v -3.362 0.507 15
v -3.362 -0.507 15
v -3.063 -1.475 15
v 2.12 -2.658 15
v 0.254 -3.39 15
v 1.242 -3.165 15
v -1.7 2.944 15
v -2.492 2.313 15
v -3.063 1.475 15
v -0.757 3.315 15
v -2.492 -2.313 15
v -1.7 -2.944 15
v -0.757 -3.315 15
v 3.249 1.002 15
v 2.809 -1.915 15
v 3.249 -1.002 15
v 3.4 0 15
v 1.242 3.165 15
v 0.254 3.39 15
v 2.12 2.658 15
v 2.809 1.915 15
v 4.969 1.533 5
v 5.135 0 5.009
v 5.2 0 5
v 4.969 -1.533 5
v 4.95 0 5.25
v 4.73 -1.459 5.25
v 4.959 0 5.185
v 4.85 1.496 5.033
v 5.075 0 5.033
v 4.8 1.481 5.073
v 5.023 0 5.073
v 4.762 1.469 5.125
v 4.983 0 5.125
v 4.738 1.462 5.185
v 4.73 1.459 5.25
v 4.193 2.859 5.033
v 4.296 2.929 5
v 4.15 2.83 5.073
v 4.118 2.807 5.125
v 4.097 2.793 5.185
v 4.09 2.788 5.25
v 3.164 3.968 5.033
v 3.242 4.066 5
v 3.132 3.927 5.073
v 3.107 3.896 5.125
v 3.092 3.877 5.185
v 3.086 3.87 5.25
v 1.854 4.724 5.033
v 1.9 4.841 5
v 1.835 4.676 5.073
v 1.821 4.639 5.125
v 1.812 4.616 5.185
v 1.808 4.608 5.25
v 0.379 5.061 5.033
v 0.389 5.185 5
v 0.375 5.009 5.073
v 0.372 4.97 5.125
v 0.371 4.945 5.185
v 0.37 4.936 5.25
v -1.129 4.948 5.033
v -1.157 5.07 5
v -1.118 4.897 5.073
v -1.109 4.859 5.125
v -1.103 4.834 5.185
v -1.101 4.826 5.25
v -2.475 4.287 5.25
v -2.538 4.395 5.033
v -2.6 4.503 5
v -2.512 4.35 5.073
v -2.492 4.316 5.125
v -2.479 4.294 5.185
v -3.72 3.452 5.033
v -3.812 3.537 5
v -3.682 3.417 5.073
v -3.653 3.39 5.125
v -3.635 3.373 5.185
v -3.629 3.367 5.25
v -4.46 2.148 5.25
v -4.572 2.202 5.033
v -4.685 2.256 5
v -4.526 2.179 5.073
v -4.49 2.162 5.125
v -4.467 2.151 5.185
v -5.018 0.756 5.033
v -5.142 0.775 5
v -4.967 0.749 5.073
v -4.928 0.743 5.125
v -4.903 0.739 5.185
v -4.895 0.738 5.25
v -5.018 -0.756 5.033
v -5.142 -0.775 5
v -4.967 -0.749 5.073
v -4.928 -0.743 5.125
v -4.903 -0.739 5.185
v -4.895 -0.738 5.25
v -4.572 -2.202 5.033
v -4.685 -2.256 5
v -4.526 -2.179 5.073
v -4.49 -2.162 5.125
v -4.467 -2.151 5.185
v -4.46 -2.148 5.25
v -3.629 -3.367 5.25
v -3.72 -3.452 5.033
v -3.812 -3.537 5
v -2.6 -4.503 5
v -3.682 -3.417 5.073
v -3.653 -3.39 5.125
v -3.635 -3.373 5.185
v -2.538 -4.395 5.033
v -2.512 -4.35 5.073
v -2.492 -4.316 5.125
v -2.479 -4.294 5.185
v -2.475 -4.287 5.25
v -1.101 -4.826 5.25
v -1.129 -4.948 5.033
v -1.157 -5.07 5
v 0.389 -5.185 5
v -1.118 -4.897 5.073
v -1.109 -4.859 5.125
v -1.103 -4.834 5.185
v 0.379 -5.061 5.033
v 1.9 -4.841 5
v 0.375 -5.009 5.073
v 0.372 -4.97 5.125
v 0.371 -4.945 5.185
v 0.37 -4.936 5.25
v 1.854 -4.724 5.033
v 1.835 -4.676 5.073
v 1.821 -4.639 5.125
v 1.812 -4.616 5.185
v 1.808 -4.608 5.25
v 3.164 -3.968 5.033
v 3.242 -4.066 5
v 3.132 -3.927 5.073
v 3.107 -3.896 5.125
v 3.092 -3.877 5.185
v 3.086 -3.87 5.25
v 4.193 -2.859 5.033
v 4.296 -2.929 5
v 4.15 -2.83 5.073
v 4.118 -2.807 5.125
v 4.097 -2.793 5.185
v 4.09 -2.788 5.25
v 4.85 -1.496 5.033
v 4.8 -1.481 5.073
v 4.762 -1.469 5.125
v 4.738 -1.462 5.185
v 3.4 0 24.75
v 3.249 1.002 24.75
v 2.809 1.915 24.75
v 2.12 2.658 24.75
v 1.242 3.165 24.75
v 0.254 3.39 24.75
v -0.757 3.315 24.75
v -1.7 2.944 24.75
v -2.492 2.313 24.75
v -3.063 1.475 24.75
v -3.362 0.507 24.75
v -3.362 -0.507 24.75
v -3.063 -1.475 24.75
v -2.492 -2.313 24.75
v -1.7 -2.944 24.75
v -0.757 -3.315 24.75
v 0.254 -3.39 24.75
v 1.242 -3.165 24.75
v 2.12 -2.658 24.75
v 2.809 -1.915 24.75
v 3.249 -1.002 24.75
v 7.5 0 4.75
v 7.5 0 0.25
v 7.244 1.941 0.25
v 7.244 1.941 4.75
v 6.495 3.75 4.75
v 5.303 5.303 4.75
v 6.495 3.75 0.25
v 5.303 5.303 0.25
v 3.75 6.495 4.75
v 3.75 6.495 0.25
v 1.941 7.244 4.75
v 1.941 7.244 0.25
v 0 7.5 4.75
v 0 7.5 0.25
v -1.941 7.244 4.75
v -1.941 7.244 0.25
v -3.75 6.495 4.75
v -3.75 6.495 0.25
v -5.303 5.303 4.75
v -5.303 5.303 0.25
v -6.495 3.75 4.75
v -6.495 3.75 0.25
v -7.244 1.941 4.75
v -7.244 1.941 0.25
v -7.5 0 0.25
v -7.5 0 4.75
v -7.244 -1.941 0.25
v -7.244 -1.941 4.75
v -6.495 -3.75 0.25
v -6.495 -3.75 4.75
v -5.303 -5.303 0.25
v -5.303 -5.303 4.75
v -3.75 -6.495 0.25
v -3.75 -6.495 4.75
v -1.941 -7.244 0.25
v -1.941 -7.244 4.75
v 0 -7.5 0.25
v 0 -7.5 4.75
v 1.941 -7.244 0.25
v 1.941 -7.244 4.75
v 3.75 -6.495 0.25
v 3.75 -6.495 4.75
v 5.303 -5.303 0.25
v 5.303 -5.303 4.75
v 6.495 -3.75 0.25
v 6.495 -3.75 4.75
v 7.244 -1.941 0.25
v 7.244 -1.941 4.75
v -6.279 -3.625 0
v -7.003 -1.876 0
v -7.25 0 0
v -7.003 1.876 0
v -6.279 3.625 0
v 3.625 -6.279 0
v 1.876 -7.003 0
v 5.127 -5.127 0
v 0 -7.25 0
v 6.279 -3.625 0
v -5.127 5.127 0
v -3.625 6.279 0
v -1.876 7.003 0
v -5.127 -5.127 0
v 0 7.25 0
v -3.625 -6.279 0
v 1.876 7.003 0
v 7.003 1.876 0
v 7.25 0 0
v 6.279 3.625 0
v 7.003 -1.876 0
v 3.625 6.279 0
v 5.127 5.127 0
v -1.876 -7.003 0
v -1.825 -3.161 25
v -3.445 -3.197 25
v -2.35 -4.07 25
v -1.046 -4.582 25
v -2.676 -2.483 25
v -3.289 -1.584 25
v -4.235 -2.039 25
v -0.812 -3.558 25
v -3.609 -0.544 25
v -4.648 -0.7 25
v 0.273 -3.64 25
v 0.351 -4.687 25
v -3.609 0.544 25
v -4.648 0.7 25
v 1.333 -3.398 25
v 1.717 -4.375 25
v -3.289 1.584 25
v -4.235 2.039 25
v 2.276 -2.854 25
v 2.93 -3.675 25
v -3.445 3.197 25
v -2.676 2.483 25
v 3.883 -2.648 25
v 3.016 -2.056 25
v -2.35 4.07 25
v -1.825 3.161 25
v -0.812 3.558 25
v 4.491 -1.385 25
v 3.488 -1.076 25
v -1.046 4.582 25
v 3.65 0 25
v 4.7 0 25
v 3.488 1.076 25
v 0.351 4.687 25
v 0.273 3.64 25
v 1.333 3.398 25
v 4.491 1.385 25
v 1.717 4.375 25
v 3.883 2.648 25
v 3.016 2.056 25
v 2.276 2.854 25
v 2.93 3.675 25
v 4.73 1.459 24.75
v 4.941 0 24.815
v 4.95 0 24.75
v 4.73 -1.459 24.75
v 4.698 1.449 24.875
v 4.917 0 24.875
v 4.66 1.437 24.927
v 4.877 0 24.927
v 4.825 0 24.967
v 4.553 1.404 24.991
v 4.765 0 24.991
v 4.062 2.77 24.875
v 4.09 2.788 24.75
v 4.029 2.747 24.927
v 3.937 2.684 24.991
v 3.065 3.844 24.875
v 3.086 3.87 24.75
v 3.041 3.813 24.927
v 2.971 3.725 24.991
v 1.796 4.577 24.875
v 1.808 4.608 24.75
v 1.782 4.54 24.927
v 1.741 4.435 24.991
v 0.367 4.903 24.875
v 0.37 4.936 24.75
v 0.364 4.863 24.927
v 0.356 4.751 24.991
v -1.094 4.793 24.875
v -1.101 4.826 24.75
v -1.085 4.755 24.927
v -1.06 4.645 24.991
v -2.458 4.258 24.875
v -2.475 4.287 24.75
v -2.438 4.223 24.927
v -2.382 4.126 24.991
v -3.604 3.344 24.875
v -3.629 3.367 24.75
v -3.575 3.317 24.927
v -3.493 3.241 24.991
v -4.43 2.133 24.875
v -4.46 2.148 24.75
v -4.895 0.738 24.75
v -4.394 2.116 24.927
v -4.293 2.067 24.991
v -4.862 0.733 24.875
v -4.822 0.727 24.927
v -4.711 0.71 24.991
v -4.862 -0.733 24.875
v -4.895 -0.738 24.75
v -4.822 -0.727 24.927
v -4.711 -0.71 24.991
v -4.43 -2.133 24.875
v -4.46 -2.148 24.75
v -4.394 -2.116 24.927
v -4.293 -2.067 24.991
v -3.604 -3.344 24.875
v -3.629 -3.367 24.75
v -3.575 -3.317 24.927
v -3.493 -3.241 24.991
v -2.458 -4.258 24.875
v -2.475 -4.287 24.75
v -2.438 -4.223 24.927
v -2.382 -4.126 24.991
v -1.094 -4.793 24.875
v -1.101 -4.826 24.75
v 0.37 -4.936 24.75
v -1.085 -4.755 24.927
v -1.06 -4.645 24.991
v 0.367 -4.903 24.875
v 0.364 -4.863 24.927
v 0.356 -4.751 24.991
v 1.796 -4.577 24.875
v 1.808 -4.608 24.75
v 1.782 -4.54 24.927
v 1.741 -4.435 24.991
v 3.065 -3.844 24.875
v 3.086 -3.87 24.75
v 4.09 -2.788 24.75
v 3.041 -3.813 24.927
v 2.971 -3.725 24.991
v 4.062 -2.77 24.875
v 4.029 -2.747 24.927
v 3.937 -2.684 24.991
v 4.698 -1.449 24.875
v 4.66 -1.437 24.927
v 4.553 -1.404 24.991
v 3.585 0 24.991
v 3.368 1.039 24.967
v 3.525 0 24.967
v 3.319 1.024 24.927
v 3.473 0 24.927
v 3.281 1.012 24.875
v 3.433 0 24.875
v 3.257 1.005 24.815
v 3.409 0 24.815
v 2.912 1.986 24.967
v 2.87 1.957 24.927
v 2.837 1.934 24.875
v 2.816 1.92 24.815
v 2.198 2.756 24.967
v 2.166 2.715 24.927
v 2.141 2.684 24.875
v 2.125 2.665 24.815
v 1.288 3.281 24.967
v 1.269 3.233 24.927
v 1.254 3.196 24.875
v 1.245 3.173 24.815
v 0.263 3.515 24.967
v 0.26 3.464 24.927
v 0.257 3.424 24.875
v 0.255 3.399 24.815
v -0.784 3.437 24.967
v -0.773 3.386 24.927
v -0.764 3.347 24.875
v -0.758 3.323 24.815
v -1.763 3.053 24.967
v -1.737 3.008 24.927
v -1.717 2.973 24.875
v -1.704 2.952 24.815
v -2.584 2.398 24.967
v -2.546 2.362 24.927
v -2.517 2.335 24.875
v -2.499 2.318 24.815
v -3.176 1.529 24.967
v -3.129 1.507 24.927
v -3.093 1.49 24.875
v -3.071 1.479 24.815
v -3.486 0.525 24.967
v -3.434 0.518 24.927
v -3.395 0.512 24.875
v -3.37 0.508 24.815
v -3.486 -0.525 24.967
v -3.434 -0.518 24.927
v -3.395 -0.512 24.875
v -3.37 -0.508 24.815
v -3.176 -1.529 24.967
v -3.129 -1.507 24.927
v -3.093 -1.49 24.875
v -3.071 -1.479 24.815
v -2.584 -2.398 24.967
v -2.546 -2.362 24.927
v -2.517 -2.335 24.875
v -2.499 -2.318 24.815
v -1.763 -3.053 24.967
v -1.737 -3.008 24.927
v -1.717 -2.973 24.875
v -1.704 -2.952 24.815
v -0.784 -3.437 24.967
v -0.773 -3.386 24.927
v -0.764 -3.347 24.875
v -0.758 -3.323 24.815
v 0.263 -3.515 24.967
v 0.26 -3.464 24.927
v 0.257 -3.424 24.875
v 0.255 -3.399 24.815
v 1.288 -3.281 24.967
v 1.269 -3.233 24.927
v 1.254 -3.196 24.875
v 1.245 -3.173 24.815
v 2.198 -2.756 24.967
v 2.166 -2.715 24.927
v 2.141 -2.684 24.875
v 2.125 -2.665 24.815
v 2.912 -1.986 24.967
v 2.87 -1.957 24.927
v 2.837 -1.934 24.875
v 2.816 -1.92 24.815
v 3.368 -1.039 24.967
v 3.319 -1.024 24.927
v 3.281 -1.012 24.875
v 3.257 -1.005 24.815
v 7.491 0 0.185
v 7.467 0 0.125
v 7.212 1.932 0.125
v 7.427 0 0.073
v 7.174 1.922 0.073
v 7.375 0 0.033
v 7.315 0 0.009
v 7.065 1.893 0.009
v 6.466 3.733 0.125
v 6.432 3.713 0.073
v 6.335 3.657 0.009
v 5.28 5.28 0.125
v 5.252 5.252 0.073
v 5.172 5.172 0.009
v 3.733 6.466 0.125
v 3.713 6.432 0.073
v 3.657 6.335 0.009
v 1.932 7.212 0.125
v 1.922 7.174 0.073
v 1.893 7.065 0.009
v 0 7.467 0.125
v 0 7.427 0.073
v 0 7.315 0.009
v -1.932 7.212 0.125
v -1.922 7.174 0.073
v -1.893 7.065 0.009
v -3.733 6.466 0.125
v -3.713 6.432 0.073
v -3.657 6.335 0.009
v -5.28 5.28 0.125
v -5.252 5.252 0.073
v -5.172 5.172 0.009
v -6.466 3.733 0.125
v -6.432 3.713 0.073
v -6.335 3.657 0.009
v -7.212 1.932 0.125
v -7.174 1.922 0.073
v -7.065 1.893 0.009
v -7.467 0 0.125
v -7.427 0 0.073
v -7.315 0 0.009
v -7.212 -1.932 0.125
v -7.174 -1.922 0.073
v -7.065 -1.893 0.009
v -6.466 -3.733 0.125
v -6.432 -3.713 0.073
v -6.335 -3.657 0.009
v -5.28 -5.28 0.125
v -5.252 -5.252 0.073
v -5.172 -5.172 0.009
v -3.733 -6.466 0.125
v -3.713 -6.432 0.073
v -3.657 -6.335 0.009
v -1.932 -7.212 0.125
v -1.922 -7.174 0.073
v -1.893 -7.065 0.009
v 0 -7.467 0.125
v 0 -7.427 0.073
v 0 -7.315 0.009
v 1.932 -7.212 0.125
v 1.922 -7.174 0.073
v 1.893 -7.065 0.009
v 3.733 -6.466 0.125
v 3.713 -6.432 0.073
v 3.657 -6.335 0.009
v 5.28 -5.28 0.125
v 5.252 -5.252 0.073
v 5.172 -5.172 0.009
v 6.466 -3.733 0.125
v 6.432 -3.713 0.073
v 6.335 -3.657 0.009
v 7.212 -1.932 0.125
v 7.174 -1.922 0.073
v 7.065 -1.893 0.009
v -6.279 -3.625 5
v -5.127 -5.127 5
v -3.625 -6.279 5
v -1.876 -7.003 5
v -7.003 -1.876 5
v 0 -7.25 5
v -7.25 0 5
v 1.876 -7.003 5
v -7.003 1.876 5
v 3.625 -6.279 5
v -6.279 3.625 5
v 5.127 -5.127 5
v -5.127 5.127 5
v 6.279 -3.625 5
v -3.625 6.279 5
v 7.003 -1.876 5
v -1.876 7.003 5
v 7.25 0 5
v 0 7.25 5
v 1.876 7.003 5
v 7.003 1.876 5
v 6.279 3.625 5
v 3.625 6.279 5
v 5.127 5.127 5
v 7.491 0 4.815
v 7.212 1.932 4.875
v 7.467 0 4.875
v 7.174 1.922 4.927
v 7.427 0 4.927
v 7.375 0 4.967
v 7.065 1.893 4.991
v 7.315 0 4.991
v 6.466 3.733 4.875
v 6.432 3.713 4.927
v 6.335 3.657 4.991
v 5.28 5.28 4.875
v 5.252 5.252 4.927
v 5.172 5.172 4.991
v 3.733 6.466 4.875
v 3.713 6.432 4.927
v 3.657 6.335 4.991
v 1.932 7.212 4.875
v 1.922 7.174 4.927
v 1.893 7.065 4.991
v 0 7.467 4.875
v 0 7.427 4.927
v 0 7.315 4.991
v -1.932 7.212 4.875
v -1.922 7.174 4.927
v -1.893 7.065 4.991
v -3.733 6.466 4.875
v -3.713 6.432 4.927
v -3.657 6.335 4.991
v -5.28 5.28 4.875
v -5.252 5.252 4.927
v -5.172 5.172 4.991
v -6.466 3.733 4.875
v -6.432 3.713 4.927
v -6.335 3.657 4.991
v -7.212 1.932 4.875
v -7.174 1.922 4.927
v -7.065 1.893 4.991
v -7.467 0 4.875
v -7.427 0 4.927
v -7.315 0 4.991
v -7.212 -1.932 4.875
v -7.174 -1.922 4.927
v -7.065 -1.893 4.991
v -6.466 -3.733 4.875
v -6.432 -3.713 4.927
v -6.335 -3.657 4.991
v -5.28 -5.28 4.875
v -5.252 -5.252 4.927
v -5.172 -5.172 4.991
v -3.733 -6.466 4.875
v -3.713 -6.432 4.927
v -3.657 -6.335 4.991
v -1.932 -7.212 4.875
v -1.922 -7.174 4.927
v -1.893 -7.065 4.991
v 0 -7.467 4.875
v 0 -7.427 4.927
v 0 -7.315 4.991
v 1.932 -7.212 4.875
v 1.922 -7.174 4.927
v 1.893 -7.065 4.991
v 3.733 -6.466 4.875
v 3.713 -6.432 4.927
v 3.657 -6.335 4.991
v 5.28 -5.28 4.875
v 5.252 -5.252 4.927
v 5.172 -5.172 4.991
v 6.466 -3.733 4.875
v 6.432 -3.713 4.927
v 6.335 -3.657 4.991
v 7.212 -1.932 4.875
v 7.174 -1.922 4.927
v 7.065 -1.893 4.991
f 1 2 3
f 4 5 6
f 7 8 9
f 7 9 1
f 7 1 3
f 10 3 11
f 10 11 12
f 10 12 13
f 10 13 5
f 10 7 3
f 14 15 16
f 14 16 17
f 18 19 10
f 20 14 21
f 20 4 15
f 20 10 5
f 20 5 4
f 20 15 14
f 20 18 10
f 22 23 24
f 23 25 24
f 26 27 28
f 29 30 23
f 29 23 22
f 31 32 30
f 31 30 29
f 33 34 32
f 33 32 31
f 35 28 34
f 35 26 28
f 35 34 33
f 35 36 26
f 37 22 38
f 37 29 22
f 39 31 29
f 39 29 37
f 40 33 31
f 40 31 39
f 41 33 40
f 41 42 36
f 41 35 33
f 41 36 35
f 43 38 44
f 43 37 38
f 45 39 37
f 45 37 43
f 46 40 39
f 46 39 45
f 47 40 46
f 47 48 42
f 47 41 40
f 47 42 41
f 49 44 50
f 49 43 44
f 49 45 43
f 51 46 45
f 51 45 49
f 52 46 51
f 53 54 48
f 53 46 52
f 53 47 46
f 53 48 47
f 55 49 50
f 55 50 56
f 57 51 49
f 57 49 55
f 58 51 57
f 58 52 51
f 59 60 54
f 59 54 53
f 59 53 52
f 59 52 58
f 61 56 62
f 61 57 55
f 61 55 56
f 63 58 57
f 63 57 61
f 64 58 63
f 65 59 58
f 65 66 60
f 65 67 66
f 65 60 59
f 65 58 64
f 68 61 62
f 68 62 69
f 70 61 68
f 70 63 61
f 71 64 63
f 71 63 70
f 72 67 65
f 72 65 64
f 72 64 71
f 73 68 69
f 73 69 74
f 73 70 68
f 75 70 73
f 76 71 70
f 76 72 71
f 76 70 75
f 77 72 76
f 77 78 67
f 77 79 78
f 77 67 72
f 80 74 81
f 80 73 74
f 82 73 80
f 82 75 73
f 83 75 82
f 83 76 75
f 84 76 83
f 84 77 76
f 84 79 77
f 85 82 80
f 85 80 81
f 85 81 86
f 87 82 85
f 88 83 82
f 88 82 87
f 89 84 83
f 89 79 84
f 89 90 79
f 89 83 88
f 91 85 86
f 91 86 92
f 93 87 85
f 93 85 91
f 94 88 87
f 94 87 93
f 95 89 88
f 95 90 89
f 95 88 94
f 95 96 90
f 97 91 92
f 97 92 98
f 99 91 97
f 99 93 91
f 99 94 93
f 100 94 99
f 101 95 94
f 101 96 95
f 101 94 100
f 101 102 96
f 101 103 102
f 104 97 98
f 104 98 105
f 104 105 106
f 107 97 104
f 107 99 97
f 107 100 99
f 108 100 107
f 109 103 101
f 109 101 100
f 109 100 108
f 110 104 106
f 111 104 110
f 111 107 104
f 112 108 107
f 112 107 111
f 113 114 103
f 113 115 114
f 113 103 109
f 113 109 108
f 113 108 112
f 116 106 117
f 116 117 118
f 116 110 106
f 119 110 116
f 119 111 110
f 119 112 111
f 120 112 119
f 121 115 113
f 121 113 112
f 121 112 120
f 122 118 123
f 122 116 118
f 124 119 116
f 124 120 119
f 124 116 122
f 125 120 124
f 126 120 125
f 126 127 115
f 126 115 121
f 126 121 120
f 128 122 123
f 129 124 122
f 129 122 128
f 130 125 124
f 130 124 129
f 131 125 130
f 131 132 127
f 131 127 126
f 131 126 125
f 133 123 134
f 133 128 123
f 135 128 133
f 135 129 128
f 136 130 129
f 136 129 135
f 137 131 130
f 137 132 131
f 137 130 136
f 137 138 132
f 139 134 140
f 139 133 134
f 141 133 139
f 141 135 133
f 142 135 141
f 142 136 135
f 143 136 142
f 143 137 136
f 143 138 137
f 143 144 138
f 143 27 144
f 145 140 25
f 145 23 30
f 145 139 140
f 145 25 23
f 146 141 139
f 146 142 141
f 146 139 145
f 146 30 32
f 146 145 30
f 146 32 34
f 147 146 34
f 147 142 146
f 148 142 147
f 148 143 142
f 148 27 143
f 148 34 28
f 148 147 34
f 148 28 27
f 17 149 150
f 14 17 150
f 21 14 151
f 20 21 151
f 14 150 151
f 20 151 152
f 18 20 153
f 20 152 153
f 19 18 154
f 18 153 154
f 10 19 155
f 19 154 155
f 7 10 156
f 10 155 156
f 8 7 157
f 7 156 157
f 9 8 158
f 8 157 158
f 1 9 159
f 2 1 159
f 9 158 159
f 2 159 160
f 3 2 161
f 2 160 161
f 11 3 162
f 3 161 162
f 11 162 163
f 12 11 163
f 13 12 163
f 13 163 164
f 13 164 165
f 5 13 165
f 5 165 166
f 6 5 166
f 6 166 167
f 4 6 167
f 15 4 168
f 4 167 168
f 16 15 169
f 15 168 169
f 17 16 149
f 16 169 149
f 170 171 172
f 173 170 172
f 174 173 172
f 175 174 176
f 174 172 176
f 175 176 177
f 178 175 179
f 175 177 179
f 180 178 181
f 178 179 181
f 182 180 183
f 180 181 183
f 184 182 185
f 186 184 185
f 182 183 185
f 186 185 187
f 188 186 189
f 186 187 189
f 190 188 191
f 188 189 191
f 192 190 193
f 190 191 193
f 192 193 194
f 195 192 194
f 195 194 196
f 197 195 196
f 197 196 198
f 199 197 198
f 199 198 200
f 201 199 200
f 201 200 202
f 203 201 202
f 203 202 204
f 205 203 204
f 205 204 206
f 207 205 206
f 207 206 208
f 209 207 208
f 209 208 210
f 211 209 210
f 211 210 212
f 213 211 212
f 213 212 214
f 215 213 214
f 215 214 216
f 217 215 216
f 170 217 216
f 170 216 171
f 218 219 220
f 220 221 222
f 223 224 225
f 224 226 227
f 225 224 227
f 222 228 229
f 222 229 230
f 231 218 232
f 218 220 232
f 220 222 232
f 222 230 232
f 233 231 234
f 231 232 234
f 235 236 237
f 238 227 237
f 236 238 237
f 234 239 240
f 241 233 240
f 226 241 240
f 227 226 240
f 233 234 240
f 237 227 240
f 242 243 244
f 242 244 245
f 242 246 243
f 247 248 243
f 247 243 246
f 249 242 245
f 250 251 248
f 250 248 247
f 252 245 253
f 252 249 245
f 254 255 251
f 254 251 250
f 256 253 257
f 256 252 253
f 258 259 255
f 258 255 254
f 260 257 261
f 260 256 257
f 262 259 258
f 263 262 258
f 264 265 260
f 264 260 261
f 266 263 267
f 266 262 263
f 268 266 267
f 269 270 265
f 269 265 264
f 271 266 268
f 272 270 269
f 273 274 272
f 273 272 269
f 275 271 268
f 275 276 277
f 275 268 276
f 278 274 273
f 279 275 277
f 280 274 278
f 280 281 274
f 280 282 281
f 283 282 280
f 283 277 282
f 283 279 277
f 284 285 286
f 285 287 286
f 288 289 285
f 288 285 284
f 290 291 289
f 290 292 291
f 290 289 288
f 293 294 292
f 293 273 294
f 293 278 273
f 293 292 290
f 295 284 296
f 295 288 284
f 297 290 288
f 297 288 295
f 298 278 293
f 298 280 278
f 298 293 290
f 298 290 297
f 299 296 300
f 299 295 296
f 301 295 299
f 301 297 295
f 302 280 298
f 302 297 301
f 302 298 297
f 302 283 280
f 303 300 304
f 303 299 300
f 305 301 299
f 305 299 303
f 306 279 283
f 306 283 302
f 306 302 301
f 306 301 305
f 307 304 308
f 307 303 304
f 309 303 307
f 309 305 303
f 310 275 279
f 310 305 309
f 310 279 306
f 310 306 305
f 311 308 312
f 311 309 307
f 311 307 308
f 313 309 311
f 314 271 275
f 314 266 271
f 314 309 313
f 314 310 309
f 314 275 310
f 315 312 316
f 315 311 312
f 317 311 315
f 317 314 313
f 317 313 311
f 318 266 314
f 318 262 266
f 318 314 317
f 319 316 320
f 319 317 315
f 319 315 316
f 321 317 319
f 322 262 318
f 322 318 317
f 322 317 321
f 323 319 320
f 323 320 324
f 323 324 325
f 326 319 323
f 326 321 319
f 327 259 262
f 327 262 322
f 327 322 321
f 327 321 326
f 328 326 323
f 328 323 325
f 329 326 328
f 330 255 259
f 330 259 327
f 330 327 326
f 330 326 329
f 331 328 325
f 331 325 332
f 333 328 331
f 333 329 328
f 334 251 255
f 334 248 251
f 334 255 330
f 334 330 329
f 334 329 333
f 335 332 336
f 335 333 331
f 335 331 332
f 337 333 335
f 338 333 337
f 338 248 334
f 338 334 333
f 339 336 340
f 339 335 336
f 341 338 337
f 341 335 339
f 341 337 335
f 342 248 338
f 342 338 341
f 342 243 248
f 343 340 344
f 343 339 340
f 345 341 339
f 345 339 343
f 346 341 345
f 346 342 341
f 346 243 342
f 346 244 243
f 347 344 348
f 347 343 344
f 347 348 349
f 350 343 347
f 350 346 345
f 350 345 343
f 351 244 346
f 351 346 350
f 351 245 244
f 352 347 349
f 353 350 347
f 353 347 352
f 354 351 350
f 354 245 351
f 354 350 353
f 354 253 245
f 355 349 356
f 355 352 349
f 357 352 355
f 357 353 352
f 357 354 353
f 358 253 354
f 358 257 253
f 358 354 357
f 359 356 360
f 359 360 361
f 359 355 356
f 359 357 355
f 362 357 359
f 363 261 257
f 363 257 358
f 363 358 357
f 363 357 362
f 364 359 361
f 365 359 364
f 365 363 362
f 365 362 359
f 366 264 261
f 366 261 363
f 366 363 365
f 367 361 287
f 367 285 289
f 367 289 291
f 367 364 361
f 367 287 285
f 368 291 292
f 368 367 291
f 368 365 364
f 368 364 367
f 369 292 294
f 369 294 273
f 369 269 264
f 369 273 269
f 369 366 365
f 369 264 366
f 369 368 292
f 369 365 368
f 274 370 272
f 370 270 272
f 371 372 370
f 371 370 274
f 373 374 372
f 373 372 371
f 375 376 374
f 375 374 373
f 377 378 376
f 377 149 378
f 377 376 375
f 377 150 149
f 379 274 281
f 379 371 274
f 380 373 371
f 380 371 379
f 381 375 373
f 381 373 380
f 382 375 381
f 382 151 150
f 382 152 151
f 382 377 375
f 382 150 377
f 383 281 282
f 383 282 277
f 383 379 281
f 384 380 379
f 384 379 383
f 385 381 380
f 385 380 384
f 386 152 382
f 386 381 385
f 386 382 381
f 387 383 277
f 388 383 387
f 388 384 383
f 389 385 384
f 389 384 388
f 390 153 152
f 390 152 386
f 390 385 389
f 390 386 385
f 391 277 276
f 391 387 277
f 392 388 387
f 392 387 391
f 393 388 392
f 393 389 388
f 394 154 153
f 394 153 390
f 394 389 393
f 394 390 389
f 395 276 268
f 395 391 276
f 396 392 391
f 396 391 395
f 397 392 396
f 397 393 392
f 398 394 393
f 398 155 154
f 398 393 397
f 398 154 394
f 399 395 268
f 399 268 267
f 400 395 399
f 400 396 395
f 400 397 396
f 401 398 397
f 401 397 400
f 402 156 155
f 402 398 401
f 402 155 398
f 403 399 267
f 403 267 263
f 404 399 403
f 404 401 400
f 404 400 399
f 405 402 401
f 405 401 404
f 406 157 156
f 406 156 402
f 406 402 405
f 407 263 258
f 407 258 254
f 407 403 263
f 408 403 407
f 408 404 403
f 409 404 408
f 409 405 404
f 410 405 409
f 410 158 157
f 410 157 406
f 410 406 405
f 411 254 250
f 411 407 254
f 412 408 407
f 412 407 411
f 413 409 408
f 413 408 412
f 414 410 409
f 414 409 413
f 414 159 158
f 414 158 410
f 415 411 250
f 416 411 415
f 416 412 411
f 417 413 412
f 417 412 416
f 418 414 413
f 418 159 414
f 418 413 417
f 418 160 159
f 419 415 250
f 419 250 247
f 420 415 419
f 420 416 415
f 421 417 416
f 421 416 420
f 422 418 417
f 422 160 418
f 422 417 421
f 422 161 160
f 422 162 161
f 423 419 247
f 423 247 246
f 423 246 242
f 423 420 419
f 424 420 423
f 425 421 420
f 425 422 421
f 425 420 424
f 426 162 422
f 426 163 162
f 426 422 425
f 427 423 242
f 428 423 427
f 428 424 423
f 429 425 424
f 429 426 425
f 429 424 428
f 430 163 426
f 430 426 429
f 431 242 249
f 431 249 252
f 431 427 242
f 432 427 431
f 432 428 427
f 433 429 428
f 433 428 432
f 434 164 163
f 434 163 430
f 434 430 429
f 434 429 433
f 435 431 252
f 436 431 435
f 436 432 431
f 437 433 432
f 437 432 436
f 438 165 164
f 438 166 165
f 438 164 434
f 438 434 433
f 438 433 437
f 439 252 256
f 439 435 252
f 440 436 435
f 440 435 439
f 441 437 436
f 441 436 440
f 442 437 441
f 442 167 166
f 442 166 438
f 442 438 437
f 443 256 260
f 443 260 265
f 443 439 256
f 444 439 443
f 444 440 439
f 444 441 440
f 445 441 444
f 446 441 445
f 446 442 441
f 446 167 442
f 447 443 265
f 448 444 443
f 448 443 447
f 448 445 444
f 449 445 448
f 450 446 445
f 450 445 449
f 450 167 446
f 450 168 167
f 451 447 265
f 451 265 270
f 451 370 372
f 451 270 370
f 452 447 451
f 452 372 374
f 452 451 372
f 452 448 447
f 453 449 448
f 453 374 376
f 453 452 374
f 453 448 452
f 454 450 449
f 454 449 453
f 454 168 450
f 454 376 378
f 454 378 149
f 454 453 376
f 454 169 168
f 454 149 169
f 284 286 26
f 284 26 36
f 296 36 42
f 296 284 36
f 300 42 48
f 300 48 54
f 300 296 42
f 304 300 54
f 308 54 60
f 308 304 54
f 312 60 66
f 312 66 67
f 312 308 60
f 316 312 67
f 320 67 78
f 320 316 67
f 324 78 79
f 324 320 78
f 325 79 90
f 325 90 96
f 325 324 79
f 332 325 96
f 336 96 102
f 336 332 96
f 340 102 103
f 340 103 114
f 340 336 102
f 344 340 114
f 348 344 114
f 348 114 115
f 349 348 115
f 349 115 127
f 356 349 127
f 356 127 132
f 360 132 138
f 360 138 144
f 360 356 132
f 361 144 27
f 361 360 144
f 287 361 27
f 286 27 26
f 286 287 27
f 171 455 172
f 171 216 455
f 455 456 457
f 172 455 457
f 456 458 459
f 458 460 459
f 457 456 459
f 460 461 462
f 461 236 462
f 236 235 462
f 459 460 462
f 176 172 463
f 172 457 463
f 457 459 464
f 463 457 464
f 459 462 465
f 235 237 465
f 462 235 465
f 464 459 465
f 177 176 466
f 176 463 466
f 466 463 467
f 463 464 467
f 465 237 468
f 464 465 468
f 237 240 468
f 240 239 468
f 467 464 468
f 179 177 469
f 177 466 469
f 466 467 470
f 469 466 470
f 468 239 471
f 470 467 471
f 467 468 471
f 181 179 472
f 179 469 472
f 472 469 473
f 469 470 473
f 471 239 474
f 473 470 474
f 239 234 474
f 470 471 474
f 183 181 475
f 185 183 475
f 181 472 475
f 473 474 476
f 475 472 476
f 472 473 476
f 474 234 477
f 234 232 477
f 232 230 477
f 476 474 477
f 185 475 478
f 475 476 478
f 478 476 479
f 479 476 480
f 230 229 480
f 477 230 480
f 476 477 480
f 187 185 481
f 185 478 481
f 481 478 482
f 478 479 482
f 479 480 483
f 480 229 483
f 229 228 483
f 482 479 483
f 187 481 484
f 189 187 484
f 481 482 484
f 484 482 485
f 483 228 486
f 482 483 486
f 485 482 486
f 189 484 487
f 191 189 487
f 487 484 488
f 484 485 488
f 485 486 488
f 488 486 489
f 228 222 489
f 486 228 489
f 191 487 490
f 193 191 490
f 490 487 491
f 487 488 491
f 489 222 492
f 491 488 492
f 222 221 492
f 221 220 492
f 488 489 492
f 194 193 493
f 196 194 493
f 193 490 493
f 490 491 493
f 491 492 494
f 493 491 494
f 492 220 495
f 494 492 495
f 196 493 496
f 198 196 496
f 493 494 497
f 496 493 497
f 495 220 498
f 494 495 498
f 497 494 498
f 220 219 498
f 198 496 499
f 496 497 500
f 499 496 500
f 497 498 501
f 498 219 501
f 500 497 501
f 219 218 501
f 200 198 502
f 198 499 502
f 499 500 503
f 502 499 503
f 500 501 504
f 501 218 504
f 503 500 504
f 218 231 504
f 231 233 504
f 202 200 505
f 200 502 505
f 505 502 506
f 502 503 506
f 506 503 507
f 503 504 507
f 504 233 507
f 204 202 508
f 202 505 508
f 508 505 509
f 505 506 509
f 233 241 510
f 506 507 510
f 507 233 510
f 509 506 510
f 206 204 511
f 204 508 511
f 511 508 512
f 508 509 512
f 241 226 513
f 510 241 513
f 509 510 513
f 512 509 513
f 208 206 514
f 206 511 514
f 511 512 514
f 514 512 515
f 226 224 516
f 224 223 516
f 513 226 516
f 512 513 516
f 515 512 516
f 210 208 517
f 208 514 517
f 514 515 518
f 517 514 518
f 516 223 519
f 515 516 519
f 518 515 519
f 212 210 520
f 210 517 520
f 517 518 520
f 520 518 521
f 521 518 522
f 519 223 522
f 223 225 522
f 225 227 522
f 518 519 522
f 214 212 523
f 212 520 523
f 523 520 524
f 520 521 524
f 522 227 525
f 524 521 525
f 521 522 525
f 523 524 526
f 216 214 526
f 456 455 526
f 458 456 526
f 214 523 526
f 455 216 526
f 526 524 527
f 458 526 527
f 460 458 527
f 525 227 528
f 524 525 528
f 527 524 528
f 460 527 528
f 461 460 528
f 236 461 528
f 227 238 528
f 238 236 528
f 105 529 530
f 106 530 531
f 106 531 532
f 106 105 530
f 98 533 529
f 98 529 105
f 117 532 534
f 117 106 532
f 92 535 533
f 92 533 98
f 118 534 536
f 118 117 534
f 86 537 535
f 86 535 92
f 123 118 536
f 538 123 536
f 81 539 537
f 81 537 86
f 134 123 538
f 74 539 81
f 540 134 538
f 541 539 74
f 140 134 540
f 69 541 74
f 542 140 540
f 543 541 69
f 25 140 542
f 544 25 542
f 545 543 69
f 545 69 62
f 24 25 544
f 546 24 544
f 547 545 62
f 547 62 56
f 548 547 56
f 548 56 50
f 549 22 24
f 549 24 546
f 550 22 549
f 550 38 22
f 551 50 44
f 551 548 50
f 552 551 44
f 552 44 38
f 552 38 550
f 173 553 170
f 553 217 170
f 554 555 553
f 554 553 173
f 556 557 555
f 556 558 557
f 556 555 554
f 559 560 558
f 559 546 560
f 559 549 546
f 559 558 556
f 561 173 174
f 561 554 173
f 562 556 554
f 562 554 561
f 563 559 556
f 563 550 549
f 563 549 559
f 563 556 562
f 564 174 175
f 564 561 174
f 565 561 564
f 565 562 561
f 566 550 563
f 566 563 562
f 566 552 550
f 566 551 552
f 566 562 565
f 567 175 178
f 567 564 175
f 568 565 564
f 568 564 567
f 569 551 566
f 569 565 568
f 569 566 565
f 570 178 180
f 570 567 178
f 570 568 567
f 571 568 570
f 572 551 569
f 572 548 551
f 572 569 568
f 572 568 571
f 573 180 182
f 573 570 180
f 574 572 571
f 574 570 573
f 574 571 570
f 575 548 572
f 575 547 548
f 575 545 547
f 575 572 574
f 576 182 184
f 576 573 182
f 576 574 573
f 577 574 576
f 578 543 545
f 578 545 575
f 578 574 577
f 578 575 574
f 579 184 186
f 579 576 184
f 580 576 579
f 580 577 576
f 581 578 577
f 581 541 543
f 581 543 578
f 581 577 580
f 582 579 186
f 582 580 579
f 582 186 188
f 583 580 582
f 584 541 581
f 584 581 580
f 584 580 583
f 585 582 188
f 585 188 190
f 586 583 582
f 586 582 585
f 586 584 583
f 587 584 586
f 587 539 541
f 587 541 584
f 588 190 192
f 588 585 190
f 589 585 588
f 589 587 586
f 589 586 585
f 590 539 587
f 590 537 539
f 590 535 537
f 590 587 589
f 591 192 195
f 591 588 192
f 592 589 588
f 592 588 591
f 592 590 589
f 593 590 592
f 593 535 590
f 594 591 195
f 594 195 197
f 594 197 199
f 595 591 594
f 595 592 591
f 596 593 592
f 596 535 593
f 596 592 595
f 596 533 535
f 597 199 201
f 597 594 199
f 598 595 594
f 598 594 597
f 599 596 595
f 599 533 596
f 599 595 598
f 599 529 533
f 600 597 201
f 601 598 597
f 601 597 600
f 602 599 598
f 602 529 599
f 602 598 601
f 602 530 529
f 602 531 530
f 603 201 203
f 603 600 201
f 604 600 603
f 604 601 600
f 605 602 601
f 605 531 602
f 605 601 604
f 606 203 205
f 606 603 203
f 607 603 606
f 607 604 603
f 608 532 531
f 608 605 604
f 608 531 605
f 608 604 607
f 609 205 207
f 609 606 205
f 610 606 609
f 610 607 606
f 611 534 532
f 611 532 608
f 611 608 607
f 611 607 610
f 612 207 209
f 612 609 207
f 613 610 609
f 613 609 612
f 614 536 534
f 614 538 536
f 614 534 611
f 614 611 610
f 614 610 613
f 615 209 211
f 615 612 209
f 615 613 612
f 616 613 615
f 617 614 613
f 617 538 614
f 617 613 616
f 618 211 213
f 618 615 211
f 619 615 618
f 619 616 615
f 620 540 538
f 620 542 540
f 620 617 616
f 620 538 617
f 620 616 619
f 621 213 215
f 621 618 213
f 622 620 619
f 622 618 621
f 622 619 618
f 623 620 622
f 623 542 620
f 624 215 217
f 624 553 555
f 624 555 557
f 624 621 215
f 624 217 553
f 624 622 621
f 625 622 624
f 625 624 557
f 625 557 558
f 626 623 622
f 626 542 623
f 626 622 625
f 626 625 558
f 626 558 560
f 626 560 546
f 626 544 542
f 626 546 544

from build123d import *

# Parameters (mm, degrees)
F0_R     = 7.5
F1_DEPTH = 25
F2_R     = 7.5
F2_R_2   = 4.95
F3_DEPTH = 20
F4_R     = 3.4
F5_DEPTH = 10
F6_R     = 0.25


with BuildPart() as f1:
    # F0 (on Top) → F1 (new body)
    with BuildSketch(Plane.XY):
        Circle(F0_R)
    extrude(amount=F1_DEPTH)

    # F2 (on face) → F3 (cut)
    with BuildSketch(Plane.XY.offset(25)):
        Circle(F2_R)
        Circle(F2_R_2, mode=Mode.SUBTRACT)
    extrude(amount=-F3_DEPTH, mode=Mode.SUBTRACT)

    # F4 (on face) → F5 (cut)
    with BuildSketch(Plane.XY.offset(25)):
        Circle(F4_R)
    extrude(amount=-F5_DEPTH, mode=Mode.SUBTRACT)

    # F6
    f6_edges = [f1.edges().sort_by_distance(p)[0] for p in [
        (-7.5, 0, 5),
        (-7.5, 0, 0),
        (-4.95, 0, 25),
        (-3.4, 0, 25),
        (-4.95, 0, 5),
    ]]
    fillet(f6_edges, radius=F6_R)


solid = f1.part
